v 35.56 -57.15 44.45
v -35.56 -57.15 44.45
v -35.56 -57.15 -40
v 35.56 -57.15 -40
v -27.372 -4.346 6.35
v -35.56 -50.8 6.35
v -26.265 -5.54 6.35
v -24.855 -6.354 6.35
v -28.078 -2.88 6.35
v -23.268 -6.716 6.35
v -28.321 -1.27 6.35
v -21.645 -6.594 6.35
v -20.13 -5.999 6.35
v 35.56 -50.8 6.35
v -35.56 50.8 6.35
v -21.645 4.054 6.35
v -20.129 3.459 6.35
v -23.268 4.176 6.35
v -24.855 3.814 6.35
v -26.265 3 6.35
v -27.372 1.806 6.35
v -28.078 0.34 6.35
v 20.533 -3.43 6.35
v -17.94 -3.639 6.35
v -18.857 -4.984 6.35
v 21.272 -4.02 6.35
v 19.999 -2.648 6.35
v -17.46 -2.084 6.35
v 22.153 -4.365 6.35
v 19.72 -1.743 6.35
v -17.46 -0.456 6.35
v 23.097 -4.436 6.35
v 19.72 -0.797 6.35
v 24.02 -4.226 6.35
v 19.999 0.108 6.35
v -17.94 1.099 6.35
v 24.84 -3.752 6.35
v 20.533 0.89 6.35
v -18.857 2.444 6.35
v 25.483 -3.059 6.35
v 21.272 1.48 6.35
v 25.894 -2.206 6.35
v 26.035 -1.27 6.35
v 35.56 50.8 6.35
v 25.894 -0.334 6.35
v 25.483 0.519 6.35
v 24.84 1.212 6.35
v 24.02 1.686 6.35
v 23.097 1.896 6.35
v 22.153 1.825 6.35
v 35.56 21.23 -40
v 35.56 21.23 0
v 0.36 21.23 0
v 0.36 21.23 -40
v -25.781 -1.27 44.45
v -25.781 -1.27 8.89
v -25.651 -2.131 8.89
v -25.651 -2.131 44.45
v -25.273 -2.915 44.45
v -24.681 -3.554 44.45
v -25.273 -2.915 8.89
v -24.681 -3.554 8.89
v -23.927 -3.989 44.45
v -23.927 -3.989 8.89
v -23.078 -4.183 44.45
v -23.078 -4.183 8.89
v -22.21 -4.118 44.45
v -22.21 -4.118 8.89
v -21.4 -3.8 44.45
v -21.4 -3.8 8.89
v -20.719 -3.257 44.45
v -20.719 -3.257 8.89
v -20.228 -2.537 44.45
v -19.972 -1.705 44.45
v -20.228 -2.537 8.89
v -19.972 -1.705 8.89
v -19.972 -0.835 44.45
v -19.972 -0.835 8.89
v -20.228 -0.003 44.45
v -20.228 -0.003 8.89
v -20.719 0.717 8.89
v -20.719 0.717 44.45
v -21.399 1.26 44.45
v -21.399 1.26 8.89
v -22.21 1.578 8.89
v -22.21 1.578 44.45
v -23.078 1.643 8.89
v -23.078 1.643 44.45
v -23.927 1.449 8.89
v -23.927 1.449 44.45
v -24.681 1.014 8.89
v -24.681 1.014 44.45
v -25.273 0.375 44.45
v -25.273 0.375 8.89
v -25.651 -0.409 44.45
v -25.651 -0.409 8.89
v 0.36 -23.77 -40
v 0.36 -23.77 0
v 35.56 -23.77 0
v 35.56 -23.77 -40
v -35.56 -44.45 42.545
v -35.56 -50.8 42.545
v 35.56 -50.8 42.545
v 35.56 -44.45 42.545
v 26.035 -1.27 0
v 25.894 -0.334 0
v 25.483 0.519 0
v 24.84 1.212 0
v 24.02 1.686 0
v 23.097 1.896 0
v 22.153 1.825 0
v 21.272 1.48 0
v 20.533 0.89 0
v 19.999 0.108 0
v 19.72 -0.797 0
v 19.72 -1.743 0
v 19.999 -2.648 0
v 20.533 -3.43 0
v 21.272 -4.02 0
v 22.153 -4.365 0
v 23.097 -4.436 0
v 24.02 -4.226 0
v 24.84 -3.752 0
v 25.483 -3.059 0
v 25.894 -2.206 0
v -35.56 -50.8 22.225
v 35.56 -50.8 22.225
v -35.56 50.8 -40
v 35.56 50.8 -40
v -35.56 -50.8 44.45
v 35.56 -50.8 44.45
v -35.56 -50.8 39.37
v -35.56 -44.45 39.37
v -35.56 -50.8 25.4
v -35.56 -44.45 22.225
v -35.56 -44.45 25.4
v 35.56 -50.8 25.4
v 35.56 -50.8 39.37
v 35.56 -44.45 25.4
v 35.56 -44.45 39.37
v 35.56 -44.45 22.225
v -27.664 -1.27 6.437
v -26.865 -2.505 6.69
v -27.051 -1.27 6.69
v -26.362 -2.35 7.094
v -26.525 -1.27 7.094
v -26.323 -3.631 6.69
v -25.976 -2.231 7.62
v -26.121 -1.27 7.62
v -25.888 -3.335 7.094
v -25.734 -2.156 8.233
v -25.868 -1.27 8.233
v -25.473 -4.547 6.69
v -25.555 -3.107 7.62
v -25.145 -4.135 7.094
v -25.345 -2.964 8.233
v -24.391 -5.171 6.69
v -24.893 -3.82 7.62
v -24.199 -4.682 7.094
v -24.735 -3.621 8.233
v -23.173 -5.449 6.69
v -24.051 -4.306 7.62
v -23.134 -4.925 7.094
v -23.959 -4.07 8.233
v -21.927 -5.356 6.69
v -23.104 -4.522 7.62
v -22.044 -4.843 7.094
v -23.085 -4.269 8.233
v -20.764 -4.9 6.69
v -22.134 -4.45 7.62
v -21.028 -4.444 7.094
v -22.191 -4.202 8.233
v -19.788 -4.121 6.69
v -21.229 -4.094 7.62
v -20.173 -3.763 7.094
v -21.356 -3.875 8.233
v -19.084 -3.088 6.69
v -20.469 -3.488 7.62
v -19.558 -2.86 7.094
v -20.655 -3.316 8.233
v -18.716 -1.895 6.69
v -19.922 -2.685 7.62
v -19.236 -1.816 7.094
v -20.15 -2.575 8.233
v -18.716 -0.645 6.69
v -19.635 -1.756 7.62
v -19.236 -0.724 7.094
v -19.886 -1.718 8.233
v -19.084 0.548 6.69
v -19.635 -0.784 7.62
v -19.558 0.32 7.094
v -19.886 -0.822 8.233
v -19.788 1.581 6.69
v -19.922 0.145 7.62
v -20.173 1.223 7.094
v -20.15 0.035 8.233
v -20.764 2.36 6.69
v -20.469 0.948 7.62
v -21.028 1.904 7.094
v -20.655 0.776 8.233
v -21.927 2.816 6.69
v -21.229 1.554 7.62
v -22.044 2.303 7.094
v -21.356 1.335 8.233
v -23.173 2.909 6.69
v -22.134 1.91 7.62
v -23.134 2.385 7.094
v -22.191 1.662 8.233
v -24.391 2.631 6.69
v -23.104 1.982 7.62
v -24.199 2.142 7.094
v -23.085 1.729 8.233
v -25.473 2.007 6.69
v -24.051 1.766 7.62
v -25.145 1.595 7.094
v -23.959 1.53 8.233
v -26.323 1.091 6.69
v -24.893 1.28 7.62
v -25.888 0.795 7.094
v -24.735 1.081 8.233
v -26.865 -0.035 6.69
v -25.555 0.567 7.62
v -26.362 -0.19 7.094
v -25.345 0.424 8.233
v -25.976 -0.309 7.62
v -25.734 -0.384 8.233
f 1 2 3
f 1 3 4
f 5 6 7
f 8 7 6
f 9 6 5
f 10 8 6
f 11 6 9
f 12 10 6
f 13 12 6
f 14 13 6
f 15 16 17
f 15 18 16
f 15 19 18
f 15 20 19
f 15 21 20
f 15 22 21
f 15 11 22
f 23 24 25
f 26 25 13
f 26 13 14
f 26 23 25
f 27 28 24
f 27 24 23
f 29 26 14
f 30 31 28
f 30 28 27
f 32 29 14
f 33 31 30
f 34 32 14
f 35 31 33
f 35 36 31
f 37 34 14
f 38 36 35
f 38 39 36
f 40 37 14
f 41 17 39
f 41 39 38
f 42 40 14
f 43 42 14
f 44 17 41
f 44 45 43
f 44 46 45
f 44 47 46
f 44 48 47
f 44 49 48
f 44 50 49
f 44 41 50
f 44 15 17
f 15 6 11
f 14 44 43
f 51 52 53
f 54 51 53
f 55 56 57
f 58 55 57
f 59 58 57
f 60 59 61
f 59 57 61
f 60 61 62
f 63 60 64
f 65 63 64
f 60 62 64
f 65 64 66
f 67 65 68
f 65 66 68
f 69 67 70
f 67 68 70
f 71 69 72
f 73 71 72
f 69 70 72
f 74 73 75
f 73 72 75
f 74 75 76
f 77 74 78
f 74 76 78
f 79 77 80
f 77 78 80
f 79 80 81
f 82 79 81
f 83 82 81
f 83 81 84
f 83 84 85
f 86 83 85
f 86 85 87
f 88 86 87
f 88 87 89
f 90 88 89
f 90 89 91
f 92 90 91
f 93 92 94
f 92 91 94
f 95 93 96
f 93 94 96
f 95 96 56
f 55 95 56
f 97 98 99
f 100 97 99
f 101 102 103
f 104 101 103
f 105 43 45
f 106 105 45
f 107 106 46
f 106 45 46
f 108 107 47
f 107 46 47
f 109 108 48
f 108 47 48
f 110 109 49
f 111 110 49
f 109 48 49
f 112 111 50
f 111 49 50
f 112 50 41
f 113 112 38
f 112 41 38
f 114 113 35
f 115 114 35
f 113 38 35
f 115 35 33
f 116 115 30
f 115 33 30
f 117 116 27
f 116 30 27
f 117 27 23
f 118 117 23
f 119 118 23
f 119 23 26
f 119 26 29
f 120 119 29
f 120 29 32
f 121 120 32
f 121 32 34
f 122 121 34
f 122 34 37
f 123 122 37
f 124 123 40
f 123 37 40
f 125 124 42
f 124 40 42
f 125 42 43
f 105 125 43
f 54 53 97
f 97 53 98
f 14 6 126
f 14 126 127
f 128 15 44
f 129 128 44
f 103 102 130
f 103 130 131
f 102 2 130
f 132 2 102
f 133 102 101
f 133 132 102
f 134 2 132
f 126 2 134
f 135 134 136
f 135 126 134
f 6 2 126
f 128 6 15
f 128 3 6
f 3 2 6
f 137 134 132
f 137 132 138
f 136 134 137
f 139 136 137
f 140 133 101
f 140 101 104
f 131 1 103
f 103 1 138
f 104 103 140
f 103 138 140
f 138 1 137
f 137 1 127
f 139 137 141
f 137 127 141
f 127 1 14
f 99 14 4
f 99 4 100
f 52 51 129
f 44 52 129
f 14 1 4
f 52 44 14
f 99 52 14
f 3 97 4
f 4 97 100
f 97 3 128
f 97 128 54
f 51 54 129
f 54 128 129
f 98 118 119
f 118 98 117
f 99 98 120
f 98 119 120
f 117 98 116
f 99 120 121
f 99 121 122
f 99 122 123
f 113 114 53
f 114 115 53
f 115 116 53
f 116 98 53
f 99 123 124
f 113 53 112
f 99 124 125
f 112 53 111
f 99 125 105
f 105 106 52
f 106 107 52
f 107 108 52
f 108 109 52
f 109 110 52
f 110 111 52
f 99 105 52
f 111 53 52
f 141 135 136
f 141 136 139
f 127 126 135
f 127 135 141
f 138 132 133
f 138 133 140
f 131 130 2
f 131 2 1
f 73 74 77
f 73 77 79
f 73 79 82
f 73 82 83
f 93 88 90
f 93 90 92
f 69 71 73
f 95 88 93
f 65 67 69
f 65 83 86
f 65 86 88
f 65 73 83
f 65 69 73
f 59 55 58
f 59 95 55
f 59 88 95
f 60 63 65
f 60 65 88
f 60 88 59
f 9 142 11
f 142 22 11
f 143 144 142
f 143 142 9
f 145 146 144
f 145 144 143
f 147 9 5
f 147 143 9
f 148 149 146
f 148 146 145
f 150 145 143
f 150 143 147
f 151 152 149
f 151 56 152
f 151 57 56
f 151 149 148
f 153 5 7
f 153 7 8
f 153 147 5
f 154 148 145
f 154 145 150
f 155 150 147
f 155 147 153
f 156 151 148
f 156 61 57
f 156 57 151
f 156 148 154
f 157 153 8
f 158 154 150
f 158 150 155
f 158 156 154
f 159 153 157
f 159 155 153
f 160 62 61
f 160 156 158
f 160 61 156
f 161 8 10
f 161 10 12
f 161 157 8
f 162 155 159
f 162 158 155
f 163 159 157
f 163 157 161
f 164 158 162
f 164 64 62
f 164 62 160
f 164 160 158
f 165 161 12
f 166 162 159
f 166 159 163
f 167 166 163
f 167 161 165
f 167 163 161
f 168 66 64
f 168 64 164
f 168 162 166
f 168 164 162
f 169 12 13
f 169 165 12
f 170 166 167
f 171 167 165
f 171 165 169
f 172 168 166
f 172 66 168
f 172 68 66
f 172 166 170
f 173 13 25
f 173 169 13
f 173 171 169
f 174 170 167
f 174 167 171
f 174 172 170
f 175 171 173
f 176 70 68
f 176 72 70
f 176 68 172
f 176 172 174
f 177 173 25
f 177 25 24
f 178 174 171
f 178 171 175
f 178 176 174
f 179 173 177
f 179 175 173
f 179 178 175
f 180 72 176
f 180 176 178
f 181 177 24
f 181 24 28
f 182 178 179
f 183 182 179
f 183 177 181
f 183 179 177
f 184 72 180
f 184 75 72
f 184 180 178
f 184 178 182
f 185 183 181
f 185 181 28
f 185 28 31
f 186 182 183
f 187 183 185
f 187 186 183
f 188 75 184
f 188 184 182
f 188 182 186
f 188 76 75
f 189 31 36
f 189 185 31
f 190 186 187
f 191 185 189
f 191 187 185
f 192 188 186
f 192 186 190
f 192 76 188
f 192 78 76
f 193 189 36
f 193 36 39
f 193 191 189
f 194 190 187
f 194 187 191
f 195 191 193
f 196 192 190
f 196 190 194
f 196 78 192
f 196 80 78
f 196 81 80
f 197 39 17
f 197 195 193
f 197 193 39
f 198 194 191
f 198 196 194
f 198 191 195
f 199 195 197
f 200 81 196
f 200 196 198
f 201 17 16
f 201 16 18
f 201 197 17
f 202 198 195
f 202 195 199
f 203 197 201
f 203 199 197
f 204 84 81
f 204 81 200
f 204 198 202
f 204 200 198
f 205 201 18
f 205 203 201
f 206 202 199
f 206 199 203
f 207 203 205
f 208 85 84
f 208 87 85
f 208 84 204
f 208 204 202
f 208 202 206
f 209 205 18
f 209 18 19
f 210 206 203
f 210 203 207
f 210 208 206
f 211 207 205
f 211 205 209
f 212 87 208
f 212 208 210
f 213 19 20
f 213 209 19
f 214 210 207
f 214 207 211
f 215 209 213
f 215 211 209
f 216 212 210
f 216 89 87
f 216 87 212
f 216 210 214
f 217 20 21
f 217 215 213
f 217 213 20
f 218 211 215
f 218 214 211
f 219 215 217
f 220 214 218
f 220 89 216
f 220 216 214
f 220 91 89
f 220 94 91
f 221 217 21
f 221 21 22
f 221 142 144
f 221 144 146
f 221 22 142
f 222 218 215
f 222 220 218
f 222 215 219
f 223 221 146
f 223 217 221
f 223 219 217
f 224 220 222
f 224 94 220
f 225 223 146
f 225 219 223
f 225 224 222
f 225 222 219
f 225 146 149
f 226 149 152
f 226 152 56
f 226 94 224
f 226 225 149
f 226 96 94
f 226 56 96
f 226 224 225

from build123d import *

# Parameters (mm, degrees)
SKETCH1_W                = 71.12
SKETCH1_H                = 101.6
BOSS_EXTRUDE1_DEPTH      = 6.35
SKETCH2_R                = 3.175
CUT_EXTRUDE2_DEPTH       = 6.35
BOSS_EXTRUDE2_DEPTH      = 40
SKETCH4_R                = 2.921
BOSS_EXTRUDE4_DEPTH      = 38.1
FILLET1_R                = 2.54
BOSS_EXTRUDE5_DEPTH      = 38.1
BOSS_EXTRUDE5_DEPTH_BACK = 46.35
SKETCH5_W                = 71.12
SKETCH5_H                = 6.35
SKETCH8_W                = 71.12
SKETCH8_H                = 3.175
BOSS_EXTRUDE6_DEPTH      = 6.35


with BuildPart() as part:
    # Sketch1 → Boss-Extrude1 (new body)
    with BuildSketch(Plane.XY):
        Rectangle(SKETCH1_W, SKETCH1_H)
    extrude(amount=BOSS_EXTRUDE1_DEPTH)

    # Sketch2 → Cut-Extrude2 (cut)
    with BuildSketch(Plane.XY.offset(6.35)):
        with Locations((22.86, -1.27)):
            Circle(SKETCH2_R)
    extrude(amount=-CUT_EXTRUDE2_DEPTH, mode=Mode.SUBTRACT)

    # Sketch6 → Boss-Extrude2 (add)
    with BuildSketch(Plane(origin=(0, 0, 0), x_dir=(-1, 0, 0), z_dir=(0, 0, -1))):
        Polygon((-35.56, 50.8), (-35.56, 21.23), (-0.36, 21.23), (-0.36, -23.77), (-35.56, -23.77), (-35.56, -50.8), (35.56, -50.8), (35.56, 50.8), align=None)
    extrude(amount=BOSS_EXTRUDE2_DEPTH)

    # Sketch4 → Boss-Extrude4 (add)
    with BuildSketch(Plane.XY.offset(6.35)):
        with Locations(Location((-22.86, -1.27, 0), (0, 0, 180))):
            Circle(SKETCH4_R)
    extrude(amount=BOSS_EXTRUDE4_DEPTH)

    # Fillet1
    fillet1_edges = [part.edges().sort_by_distance(p)[0] for p in [
        (-19.939, -1.27, 6.35),
    ]]
    fillet(fillet1_edges, radius=FILLET1_R)

    # Sketch5 → Boss-Extrude5 (add, two sides: drawn at the far end of the back side and taken through both)
    with BuildSketch(Plane.XY.offset(6.35).offset(-BOSS_EXTRUDE5_DEPTH_BACK)):
        with Locations((0, -53.975)):
            Rectangle(SKETCH5_W, SKETCH5_H)
    extrude(amount=BOSS_EXTRUDE5_DEPTH + BOSS_EXTRUDE5_DEPTH_BACK)

    # Sketch8 → Boss-Extrude6 (add)
    with BuildSketch(Plane(origin=(0, -50.8, 0), x_dir=(1, 0, 0), z_dir=(0, 1, 0))):
        with Locations((0, -23.8125)):
            Rectangle(SKETCH8_W, SKETCH8_H)
        with Locations((0, -40.9575)):
            Rectangle(SKETCH8_W, SKETCH8_H)
    extrude(amount=BOSS_EXTRUDE6_DEPTH)


solid = part.part
